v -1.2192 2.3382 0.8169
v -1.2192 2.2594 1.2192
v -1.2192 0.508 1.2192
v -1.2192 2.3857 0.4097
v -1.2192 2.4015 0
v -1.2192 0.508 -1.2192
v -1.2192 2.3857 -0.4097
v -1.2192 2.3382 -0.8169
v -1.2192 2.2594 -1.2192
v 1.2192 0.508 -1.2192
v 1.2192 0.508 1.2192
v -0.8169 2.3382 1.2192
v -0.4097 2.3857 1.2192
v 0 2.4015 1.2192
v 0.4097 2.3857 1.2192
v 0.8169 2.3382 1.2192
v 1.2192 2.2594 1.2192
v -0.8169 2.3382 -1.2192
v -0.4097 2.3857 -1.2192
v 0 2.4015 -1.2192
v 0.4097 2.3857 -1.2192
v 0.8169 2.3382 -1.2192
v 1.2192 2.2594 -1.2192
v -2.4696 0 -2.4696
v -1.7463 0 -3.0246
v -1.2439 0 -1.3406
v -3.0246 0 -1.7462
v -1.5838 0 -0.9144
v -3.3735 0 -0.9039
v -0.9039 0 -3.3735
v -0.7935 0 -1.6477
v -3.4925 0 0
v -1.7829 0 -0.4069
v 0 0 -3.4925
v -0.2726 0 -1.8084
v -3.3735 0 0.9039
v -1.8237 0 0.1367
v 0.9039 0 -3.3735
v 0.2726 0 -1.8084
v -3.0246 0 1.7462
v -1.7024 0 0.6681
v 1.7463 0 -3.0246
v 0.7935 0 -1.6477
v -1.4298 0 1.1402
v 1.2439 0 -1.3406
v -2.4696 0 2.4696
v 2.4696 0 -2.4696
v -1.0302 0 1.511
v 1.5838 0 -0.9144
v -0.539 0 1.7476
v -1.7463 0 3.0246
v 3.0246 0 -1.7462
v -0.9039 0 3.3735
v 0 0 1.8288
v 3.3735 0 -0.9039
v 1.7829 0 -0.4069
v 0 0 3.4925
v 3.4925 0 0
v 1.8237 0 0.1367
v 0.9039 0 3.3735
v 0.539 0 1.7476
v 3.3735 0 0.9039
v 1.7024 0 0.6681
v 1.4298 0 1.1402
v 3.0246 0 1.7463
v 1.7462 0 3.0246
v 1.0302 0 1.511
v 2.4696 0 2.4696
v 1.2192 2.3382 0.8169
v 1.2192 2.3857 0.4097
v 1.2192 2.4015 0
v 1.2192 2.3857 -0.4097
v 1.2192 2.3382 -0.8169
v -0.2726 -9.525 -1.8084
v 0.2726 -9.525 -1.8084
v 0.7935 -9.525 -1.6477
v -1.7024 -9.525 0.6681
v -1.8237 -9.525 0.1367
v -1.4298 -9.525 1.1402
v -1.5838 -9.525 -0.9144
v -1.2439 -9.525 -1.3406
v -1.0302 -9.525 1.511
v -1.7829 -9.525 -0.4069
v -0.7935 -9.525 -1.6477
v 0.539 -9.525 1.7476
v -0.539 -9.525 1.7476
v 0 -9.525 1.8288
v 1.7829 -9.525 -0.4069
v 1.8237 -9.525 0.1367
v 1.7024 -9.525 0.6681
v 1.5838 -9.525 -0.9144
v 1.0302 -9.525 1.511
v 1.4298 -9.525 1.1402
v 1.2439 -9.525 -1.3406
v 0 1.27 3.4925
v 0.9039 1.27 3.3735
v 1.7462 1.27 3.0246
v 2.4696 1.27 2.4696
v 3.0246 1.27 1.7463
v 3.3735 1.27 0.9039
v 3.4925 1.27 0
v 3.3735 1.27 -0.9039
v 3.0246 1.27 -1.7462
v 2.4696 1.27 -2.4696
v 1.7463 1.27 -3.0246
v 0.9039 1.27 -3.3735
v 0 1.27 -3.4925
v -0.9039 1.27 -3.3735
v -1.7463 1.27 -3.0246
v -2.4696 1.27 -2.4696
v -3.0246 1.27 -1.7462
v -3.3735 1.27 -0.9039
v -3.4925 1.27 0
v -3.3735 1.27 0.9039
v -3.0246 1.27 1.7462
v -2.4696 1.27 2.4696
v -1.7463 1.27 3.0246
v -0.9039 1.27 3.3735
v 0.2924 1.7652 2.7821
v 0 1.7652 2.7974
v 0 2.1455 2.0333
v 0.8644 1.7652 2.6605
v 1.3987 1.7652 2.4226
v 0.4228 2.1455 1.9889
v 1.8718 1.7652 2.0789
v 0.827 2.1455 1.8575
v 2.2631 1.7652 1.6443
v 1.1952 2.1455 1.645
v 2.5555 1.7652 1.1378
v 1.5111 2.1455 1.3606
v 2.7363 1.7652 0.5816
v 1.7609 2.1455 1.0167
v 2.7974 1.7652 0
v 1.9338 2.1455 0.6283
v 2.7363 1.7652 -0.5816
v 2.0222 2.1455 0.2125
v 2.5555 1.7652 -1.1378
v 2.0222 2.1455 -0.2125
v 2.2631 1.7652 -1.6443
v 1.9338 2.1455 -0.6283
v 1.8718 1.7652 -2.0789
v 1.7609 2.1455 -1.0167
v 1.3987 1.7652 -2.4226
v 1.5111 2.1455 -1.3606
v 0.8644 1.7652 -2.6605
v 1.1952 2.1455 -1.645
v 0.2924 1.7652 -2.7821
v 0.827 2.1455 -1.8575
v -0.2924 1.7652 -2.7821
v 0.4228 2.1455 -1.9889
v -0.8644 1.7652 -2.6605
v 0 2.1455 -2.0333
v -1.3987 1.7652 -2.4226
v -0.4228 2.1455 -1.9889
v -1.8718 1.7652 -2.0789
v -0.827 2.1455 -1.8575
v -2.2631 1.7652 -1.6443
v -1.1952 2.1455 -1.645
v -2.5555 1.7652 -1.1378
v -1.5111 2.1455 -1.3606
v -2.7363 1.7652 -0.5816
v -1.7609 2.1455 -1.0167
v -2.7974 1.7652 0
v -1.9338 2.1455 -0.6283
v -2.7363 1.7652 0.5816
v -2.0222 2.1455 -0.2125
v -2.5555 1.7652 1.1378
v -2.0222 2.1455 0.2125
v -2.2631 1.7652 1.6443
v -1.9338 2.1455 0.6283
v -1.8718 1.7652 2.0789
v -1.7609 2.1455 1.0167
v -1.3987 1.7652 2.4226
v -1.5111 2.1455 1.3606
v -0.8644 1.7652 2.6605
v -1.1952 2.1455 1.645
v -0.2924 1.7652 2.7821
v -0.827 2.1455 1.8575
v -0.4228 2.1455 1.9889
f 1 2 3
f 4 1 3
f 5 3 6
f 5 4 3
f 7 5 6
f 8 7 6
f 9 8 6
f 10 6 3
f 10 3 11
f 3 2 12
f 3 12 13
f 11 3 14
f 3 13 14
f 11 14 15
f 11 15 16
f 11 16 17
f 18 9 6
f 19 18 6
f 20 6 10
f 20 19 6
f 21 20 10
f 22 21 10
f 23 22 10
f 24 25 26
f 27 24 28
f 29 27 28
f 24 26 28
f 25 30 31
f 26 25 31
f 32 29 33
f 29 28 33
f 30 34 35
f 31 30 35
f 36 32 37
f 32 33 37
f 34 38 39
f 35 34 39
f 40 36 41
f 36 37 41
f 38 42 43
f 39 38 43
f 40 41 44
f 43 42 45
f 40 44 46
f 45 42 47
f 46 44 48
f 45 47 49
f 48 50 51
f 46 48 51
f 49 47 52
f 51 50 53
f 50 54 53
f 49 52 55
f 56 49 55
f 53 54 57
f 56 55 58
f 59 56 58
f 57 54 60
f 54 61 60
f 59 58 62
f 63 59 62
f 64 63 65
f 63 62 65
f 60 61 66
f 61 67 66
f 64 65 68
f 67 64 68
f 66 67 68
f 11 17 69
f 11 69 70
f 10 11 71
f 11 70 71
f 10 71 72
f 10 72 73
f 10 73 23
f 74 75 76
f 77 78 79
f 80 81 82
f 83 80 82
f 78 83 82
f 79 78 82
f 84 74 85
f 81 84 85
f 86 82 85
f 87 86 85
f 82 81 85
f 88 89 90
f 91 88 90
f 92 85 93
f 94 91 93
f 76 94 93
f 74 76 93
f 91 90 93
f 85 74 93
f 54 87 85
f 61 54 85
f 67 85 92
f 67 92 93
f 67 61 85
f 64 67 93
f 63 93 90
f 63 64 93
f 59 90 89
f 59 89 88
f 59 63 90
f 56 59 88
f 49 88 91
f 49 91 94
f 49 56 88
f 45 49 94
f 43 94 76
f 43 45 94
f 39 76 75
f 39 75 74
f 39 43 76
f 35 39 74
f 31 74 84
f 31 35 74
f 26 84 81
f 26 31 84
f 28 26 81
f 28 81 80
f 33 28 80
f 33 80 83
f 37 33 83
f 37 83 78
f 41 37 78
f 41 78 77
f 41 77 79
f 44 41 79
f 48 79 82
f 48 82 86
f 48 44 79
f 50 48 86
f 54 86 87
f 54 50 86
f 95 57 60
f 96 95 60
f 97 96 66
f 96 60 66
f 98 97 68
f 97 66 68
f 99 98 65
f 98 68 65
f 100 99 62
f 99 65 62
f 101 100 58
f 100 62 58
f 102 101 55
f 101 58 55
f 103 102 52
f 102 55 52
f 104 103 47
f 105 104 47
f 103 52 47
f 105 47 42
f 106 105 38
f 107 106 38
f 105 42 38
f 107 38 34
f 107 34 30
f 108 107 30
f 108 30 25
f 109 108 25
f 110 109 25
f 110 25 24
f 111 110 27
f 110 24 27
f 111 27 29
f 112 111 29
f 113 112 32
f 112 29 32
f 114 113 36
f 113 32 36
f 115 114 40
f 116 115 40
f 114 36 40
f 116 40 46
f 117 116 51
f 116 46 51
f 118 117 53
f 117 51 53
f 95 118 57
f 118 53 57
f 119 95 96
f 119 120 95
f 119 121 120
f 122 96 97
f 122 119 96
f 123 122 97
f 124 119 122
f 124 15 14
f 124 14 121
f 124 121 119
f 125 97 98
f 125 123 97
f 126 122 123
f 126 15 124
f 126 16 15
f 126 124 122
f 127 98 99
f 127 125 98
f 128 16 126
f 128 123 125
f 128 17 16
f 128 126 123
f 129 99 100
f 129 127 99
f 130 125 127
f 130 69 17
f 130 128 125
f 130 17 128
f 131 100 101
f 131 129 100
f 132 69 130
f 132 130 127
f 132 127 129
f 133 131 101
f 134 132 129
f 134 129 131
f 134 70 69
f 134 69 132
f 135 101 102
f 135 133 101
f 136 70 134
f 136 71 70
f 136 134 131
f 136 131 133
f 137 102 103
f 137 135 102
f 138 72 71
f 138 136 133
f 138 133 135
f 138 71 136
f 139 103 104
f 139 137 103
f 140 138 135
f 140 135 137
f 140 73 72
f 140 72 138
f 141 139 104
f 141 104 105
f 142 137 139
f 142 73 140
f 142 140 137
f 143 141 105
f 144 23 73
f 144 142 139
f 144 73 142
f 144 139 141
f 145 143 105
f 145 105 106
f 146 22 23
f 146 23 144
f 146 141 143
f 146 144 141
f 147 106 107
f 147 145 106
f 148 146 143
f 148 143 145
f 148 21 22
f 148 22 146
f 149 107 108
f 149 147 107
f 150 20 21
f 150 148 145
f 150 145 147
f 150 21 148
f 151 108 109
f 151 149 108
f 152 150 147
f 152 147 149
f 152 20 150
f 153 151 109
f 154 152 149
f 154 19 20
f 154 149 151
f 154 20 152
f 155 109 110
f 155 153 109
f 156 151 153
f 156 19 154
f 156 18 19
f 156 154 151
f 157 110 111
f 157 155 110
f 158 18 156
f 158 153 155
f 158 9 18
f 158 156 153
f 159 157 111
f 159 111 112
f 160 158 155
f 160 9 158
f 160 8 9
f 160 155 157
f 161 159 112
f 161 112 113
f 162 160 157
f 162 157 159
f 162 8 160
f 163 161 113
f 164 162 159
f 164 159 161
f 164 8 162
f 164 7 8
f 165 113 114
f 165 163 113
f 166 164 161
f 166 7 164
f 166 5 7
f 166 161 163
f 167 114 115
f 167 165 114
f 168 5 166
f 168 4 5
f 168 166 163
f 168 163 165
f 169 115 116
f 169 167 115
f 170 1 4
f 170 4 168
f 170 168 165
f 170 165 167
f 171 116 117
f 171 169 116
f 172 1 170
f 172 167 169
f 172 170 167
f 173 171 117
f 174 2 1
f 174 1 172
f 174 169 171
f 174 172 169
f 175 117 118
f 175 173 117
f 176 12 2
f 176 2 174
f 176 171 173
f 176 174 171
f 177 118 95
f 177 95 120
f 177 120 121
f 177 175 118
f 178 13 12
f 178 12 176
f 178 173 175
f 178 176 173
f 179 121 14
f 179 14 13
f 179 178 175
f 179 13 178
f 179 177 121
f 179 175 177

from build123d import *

# Parameters (mm, degrees)
SKETCH1_R           = 1.8288
BOSS_EXTRUDE1_DEPTH = 9.525
SKETCH2_R           = 3.4925
BOSS_EXTRUDE2_DEPTH = 1.27
DOME1_FACE_RADIUS   = 3.4925
DOME1_HEIGHT        = 1.27
SKETCH3_W           = 2.4384
SKETCH3_H           = 2.4384
CUT_EXTRUDE1_DEPTH  = 2.032


with BuildPart() as part:
    # Sketch1 → Boss-Extrude1 (new body)
    with BuildSketch(Plane(origin=(0, 0, 0), x_dir=(1, 0, 0), z_dir=(0, 1, 0))):
        with Locations(Location((0, 0, 0), (0, 0, 270))):
            Circle(SKETCH1_R)
    extrude(amount=-BOSS_EXTRUDE1_DEPTH)

    # Sketch2 → Boss-Extrude2 (add)
    with BuildSketch(Plane(origin=(0, 0, 0), x_dir=(1, 0, 0), z_dir=(0, 1, 0))):
        with Locations(Location((0, 0, 0), (0, 0, 270))):
            Circle(SKETCH2_R)
    extrude(amount=BOSS_EXTRUDE2_DEPTH)

    # Dome1: a dome of height H over a round flat face of radius A is a cap of a sphere of radius (A * A + H * H) / (2 * H)
    dome1_r = (DOME1_FACE_RADIUS * DOME1_FACE_RADIUS + DOME1_HEIGHT * DOME1_HEIGHT) / (2 * DOME1_HEIGHT)
    dome1_base = Plane((0, 1.27, 0), z_dir=(0, 1, 0))
    with Locations(dome1_base.offset(DOME1_HEIGHT - dome1_r)):
        dome1_ball = Sphere(dome1_r, mode=Mode.PRIVATE)
    add(split(dome1_ball, bisect_by=dome1_base, keep=Keep.TOP, mode=Mode.PRIVATE))

    # Sketch3 → Cut-Extrude1 (cut)
    with BuildSketch(Plane(origin=(0, 2.54, 0), x_dir=(1, 0, 0), z_dir=(0, 1, 0))):
        Rectangle(SKETCH3_W, SKETCH3_H)
    extrude(amount=-CUT_EXTRUDE1_DEPTH, mode=Mode.SUBTRACT)


solid = part.part
